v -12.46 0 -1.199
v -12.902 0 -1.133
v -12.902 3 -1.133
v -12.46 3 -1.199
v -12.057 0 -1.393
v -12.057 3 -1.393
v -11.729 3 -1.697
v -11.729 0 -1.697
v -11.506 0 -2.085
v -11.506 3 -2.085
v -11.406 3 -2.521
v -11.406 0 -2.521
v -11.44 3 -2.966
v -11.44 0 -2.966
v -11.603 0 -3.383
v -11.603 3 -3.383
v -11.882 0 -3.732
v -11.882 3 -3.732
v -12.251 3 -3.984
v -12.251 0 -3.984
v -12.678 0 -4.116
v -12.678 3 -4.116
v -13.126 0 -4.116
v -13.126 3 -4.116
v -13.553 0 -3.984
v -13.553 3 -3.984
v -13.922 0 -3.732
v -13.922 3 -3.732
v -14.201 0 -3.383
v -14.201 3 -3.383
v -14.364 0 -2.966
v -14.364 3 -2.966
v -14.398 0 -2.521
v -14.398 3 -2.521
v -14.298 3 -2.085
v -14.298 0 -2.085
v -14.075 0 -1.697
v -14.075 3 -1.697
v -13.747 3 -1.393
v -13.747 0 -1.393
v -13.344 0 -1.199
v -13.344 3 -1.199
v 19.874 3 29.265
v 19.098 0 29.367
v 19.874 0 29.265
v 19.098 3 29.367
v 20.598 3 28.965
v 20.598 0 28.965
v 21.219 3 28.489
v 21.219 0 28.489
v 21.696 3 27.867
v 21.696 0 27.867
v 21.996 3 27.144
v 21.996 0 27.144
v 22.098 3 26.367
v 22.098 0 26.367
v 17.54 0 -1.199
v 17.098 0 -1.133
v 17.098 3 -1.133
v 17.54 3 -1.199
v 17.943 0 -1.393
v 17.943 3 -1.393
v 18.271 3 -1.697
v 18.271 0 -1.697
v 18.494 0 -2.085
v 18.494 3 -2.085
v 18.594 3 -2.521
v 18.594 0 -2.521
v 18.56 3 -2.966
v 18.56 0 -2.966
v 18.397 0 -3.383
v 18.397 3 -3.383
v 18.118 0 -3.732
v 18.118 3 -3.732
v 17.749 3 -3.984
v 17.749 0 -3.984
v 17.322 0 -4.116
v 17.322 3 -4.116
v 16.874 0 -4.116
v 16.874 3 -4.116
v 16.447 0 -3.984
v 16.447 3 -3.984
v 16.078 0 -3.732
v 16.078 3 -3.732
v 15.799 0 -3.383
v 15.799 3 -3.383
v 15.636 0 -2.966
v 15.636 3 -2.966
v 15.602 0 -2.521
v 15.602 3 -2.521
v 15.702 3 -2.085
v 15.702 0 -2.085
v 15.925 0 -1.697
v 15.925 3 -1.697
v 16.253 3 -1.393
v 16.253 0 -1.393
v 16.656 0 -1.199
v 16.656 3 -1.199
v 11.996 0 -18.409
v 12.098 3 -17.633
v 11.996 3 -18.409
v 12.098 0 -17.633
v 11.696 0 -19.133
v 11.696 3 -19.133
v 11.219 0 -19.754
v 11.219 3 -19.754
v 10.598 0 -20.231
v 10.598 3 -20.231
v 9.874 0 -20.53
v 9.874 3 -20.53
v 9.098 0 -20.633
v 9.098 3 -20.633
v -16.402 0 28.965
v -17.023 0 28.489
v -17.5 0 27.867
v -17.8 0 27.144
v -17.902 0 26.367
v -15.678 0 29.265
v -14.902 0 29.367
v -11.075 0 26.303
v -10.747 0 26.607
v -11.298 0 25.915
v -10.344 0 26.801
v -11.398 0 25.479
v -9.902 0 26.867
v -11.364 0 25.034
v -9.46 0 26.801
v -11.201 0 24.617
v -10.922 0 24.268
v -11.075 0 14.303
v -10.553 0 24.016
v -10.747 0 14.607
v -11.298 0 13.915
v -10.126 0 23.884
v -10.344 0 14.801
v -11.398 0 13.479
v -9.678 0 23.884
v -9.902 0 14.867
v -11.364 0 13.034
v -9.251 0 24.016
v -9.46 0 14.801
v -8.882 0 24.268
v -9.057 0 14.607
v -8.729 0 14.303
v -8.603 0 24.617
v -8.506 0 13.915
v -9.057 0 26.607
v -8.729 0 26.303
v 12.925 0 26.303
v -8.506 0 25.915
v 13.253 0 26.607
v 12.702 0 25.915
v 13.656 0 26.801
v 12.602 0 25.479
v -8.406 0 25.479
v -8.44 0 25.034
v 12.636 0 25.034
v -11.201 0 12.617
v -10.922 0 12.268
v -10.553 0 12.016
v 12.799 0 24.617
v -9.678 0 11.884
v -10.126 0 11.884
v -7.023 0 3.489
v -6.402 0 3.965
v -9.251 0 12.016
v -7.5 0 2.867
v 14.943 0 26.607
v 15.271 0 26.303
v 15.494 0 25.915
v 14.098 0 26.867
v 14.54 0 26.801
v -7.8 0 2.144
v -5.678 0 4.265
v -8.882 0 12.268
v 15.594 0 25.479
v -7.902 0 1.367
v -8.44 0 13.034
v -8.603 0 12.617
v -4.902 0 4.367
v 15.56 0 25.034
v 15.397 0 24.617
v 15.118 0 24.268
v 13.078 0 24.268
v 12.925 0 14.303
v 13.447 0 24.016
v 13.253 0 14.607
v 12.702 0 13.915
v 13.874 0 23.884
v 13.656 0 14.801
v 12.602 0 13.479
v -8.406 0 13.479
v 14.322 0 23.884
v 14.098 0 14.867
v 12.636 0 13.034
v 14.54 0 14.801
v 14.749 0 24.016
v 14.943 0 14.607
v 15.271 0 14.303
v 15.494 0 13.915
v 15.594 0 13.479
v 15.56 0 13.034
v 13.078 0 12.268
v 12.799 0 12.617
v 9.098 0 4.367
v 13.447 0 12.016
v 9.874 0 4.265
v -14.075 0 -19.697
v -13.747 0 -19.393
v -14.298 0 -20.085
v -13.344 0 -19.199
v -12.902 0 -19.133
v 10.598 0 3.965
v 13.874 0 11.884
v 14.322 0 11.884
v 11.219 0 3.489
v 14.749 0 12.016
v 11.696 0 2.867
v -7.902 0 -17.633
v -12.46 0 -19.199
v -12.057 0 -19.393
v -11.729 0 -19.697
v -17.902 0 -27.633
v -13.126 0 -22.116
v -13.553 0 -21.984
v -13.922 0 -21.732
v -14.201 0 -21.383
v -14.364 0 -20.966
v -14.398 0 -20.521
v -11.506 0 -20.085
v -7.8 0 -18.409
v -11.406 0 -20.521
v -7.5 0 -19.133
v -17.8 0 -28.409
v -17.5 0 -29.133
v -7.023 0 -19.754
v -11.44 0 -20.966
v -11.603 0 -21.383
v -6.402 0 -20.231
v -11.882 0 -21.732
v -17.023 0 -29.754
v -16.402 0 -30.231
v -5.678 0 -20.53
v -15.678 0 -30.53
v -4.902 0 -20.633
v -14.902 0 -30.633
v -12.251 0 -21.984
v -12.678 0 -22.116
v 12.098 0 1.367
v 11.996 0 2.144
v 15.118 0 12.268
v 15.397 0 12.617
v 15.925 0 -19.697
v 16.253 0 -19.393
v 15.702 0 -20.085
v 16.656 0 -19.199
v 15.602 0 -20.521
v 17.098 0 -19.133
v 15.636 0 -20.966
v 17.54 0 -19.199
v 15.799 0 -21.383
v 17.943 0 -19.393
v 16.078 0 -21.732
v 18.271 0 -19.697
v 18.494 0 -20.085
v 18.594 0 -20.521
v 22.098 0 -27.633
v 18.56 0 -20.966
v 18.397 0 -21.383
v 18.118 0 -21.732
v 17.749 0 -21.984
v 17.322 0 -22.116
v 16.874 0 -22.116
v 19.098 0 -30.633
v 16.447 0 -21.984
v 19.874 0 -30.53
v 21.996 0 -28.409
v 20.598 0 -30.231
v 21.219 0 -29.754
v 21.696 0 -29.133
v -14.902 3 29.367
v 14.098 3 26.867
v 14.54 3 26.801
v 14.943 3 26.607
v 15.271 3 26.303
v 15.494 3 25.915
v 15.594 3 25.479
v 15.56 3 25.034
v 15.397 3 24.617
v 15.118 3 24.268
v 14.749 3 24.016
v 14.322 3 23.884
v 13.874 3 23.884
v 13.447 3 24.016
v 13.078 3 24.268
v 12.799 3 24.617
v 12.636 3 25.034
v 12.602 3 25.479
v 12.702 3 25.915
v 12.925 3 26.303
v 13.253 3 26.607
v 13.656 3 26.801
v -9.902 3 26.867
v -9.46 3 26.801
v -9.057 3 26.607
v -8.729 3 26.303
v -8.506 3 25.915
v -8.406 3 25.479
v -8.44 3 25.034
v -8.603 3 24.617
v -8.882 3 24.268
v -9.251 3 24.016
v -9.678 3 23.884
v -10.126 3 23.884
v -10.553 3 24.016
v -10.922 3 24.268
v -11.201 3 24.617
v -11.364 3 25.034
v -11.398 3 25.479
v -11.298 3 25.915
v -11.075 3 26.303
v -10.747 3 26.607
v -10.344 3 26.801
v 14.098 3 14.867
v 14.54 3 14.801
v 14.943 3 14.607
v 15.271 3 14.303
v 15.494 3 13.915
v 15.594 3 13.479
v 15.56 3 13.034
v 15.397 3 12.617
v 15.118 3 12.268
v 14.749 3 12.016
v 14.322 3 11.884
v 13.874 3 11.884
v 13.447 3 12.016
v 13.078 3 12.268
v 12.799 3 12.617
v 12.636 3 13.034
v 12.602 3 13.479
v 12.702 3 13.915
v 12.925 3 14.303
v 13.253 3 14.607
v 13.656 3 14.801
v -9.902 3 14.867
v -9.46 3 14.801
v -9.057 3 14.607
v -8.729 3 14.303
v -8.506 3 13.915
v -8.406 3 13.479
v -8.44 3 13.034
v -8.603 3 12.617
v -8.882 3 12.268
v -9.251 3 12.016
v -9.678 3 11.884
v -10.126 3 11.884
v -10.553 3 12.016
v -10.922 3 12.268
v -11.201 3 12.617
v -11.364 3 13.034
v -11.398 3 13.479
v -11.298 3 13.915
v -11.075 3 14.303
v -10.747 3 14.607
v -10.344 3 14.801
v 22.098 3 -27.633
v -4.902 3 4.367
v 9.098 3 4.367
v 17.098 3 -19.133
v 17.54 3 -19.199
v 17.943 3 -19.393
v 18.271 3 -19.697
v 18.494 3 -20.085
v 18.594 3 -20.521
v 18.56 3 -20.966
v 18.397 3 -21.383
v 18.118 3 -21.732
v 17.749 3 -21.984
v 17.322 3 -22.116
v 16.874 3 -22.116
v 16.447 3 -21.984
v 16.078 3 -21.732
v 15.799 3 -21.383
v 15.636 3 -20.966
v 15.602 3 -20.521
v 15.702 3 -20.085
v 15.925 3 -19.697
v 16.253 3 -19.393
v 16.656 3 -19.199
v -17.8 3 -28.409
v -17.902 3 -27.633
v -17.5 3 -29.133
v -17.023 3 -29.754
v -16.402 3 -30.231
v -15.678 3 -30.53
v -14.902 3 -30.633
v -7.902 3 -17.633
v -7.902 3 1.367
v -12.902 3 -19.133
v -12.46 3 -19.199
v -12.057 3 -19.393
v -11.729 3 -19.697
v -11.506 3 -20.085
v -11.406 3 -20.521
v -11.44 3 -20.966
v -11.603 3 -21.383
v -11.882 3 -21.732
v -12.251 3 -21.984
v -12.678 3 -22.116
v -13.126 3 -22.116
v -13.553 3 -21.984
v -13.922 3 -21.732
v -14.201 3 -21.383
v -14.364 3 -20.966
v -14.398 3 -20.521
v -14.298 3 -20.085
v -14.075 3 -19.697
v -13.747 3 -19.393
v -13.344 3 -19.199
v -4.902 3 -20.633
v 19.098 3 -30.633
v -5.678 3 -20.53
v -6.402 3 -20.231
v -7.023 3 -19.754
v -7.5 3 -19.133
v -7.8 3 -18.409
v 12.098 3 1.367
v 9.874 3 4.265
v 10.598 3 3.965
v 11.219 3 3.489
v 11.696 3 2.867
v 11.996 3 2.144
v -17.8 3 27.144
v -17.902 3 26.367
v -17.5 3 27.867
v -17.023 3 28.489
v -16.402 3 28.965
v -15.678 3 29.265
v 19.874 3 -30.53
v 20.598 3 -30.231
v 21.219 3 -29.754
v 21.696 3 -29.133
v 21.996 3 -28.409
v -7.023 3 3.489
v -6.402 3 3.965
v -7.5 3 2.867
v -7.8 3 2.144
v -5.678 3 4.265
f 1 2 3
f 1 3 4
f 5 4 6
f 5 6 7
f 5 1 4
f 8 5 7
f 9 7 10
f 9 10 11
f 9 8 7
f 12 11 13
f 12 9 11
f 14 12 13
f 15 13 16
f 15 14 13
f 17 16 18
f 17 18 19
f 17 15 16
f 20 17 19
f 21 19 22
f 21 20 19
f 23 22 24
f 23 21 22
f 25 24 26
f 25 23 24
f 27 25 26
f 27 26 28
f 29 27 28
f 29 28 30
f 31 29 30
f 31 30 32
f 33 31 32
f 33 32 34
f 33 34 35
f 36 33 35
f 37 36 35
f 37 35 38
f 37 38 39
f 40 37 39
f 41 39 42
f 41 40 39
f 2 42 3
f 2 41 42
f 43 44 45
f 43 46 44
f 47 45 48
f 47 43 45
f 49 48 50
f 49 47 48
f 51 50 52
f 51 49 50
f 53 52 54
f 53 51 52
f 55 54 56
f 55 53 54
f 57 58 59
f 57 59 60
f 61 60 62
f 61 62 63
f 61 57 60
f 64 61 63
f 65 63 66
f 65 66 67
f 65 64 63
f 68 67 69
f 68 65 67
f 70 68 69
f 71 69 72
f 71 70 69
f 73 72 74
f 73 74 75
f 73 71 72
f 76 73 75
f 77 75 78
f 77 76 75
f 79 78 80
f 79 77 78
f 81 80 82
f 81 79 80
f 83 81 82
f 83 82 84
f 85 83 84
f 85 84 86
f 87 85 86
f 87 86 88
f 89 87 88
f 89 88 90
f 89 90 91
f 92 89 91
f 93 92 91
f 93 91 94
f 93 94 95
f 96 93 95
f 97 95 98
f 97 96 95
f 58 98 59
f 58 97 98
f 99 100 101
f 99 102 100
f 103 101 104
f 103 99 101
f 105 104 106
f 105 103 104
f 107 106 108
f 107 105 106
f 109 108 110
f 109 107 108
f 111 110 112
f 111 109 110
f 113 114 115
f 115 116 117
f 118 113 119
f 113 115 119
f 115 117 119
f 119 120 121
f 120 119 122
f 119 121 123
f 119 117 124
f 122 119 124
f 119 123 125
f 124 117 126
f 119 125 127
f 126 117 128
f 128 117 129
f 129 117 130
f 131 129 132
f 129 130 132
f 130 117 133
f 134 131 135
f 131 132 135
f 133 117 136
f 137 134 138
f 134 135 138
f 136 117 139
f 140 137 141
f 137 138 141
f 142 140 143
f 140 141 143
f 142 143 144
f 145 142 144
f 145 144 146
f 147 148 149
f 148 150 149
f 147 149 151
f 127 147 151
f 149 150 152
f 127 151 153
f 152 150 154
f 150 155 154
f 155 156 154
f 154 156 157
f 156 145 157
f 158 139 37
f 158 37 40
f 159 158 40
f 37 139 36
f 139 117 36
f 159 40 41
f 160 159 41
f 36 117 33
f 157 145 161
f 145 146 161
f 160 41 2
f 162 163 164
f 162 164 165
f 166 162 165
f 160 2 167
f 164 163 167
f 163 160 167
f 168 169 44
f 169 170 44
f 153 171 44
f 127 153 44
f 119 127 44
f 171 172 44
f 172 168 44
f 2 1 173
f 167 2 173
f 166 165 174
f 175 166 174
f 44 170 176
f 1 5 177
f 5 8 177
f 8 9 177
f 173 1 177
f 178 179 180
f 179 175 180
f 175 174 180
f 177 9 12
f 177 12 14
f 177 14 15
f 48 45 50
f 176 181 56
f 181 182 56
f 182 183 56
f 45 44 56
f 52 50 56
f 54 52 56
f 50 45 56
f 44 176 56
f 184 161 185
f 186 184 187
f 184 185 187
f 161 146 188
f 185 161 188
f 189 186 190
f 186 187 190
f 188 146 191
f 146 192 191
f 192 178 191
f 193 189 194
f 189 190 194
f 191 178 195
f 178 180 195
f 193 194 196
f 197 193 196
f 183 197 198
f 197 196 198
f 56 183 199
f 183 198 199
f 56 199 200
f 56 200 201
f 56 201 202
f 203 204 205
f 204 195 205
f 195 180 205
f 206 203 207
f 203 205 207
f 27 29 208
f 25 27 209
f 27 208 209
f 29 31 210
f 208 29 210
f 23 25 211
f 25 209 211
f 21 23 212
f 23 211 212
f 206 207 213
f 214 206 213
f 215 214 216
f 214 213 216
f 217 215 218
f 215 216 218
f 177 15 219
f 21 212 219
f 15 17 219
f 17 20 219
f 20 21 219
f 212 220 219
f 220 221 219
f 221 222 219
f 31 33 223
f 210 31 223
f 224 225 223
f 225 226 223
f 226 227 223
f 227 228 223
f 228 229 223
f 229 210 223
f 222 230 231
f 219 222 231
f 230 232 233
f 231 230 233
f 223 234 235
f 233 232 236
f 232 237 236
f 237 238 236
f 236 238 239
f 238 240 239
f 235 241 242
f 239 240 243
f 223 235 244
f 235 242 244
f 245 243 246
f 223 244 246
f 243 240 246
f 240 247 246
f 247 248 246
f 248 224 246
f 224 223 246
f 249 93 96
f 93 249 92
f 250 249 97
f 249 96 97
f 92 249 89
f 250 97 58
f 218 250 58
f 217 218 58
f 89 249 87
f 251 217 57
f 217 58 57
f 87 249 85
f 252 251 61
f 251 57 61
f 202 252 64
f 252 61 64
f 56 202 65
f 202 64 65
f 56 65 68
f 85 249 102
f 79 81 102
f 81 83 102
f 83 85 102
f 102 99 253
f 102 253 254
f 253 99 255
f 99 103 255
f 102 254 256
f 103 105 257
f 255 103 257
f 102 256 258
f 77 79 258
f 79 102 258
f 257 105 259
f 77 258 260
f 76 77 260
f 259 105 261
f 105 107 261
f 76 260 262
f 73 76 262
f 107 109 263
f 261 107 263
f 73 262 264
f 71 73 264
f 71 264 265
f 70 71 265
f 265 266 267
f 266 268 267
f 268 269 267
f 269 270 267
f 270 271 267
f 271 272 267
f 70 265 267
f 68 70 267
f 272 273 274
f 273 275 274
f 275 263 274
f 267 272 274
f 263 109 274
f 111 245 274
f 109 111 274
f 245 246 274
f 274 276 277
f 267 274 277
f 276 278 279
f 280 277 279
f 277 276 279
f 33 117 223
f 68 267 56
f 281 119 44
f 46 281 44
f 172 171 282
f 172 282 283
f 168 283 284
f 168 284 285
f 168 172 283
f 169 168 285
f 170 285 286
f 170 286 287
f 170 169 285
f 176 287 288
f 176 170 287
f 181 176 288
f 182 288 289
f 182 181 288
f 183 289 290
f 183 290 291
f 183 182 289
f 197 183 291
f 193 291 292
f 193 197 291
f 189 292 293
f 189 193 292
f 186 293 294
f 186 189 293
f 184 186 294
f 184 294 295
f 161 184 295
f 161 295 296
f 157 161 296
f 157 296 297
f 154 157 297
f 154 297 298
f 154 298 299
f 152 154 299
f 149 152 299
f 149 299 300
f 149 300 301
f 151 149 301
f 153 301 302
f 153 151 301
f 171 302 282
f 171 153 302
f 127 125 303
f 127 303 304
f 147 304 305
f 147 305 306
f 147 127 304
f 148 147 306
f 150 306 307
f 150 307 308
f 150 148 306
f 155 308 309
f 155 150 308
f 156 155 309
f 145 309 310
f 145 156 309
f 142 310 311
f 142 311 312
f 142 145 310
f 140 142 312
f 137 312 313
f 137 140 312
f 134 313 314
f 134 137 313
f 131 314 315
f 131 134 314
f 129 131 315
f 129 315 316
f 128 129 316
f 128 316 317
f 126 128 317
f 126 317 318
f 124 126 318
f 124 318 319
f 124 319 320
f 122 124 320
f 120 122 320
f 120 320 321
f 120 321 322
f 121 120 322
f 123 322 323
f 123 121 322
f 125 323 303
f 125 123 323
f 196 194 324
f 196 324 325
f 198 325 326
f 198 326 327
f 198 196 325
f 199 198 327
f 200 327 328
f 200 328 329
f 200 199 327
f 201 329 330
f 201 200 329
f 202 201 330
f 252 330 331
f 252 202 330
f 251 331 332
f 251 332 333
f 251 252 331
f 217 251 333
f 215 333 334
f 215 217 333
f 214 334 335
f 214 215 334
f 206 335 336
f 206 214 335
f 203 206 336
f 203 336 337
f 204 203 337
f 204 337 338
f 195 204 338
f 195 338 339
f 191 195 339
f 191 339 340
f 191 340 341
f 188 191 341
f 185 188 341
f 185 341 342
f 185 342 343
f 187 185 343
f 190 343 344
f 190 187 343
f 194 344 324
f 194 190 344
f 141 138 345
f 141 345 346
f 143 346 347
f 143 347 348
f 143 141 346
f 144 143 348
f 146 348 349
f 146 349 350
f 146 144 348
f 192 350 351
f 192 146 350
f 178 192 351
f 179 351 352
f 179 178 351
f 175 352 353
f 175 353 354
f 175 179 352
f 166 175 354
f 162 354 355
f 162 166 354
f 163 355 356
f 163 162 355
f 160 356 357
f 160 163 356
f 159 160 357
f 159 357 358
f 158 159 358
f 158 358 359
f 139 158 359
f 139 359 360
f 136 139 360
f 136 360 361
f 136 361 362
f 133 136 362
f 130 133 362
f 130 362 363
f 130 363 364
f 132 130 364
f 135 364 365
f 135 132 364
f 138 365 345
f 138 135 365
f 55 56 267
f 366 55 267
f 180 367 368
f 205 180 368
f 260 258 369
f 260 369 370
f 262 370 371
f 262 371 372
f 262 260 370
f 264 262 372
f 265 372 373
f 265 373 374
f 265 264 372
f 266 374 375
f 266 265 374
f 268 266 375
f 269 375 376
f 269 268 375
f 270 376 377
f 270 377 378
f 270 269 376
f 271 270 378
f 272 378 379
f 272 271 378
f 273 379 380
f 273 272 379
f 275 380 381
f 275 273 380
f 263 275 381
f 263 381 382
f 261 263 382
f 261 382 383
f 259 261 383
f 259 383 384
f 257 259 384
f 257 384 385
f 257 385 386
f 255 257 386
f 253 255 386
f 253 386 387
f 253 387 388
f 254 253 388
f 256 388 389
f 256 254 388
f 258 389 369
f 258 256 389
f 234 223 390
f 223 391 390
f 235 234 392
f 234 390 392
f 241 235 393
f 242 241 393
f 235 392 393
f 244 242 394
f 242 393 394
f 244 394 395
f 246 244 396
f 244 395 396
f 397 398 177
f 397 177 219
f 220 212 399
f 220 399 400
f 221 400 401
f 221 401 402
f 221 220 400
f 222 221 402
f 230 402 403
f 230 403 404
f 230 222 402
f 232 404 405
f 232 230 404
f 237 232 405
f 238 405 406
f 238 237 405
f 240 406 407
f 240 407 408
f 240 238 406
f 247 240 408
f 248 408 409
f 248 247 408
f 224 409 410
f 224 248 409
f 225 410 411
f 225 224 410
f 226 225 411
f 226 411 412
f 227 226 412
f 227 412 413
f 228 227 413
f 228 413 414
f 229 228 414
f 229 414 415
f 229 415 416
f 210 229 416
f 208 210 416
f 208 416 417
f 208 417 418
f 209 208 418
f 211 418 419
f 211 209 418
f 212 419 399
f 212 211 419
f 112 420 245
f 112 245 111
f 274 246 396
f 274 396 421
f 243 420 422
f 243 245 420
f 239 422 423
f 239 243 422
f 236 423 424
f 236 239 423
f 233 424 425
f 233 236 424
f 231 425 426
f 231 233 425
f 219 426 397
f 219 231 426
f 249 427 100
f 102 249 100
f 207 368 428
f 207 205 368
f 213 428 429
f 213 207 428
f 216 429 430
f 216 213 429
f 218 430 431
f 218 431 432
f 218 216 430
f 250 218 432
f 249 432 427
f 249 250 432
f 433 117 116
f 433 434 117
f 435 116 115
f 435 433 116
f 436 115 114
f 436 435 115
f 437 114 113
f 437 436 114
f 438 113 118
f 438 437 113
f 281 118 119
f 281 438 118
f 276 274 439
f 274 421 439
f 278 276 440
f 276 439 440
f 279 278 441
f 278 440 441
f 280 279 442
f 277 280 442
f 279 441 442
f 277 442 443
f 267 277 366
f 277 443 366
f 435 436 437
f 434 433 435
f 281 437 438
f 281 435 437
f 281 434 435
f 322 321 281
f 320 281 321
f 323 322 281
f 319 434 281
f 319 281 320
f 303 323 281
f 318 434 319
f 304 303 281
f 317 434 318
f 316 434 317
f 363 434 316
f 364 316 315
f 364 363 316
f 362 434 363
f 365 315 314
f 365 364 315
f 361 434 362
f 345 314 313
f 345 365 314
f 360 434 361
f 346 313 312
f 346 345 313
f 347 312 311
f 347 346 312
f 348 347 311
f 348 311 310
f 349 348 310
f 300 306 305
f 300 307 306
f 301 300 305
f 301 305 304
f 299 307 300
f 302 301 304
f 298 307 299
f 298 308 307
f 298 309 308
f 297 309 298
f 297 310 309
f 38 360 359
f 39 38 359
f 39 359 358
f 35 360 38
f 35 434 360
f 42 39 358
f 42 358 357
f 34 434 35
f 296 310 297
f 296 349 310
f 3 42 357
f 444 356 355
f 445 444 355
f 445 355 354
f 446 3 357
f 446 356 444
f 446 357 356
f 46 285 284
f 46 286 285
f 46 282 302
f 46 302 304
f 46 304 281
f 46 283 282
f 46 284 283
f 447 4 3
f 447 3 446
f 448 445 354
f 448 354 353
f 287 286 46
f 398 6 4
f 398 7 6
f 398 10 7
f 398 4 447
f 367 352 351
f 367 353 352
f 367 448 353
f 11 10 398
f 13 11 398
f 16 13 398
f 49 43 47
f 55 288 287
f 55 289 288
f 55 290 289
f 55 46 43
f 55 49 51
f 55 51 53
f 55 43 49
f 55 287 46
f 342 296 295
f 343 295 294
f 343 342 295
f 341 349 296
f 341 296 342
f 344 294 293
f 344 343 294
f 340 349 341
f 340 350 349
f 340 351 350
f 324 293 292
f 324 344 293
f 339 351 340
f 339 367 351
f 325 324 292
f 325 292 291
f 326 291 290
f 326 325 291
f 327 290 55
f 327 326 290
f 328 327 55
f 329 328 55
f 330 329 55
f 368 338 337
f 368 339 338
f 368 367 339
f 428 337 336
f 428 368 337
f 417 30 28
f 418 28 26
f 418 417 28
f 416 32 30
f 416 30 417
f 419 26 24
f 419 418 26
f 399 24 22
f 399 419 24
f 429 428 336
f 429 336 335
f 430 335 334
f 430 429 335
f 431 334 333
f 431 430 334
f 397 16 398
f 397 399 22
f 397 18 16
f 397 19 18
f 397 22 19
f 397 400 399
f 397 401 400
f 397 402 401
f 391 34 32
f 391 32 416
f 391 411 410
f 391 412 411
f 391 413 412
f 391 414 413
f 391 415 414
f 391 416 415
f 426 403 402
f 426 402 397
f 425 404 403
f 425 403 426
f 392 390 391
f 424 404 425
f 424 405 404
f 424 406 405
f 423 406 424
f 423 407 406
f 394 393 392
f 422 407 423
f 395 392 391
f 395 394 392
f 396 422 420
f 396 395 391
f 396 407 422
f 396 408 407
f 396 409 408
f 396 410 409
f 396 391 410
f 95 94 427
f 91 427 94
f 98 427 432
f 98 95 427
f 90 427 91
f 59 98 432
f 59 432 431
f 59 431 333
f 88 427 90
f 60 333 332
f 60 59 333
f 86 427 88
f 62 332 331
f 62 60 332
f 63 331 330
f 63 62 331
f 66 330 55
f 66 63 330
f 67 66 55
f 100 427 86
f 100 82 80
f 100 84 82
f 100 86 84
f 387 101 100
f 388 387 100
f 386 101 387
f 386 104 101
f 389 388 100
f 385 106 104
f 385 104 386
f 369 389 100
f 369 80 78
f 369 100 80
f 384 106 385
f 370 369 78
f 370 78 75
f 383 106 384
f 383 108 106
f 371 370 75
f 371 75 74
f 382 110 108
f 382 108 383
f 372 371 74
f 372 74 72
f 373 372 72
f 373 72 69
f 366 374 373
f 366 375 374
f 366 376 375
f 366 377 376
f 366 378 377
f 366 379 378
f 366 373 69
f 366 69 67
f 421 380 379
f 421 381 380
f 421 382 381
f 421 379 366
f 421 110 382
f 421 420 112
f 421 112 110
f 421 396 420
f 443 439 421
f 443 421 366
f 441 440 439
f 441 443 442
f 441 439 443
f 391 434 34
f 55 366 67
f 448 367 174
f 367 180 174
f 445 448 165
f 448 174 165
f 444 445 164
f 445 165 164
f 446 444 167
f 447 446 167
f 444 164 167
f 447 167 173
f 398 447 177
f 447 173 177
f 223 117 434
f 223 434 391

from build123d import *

# Parameters (mm, degrees)
SKETCH_1_W          = 40
SKETCH_1_H          = 60
SKETCH_1_R          = 1.5
EXTRUDE_1_DEPTH     = 3
FILLET_1_R          = 3
SKETCH_5_W          = 20
SKETCH_5_H          = 25
CUT_EXTRUDE_1_DEPTH = 38.89032563
FILLET_2_R          = 3


with BuildPart() as part:
    # 草图1 → 凸台-拉伸1 (new body)
    with BuildSketch(Plane(origin=(0, 0, 0), x_dir=(1, 0, 0), z_dir=(0, 1, 0))):
        with Locations((2.097965146, 0.632608651)):
            Rectangle(SKETCH_1_W, SKETCH_1_H)
        with Locations(Location((14.097965146, -25.367391349, 0), (0, 0, 270))):
            Circle(SKETCH_1_R, mode=Mode.SUBTRACT)
        with Locations(Location((-9.902034854, -25.367391349, 0), (0, 0, 270))):
            Circle(SKETCH_1_R, mode=Mode.SUBTRACT)
        with Locations(Location((14.097965146, -13.367391349, 0), (0, 0, 270))):
            Circle(SKETCH_1_R, mode=Mode.SUBTRACT)
        with Locations(Location((-9.902034854, -13.367391349, 0), (0, 0, 270))):
            Circle(SKETCH_1_R, mode=Mode.SUBTRACT)
        with Locations(Location((17.097965146, 2.632608651, 0), (0, 0, 270))):
            Circle(SKETCH_1_R, mode=Mode.SUBTRACT)
        with Locations(Location((-12.902034854, 2.632608651, 0), (0, 0, 270))):
            Circle(SKETCH_1_R, mode=Mode.SUBTRACT)
        with Locations(Location((17.097965146, 20.632608651, 0), (0, 0, 270))):
            Circle(SKETCH_1_R, mode=Mode.SUBTRACT)
        with Locations(Location((-12.902034854, 20.632608651, 0), (0, 0, 270))):
            Circle(SKETCH_1_R, mode=Mode.SUBTRACT)
    extrude(amount=EXTRUDE_1_DEPTH)

    # 圆角1
    fillet_1_edges = [part.edges().sort_by_distance(p)[0] for p in [
        (-17.902034854, 1.5, -30.632608651),
        (22.097965146, 1.5, -30.632608651),
        (22.097965146, 1.5, 29.367391349),
        (-17.902034854, 1.5, 29.367391349),
    ]]
    fillet(fillet_1_edges, radius=FILLET_1_R)

    # 草图5 → 切除-拉伸1 (cut, through all)
    with BuildSketch(Plane(origin=(0, 3, 0), x_dir=(1, 0, 0), z_dir=(0, 1, 0))):
        with Locations((2.097965146, 8.132608651)):
            Rectangle(SKETCH_5_W, SKETCH_5_H)
    extrude(amount=-CUT_EXTRUDE_1_DEPTH, mode=Mode.SUBTRACT)

    # 圆角2
    fillet_2_edges = [part.edges().sort_by_distance(p)[0] for p in [
        (-7.902034854, 1.5, 4.367391349),
        (-7.902034854, 1.5, -20.632608651),
        (12.097965146, 1.5, -20.632608651),
        (12.097965146, 1.5, 4.367391349),
    ]]
    fillet(fillet_2_edges, radius=FILLET_2_R)


solid = part.part
